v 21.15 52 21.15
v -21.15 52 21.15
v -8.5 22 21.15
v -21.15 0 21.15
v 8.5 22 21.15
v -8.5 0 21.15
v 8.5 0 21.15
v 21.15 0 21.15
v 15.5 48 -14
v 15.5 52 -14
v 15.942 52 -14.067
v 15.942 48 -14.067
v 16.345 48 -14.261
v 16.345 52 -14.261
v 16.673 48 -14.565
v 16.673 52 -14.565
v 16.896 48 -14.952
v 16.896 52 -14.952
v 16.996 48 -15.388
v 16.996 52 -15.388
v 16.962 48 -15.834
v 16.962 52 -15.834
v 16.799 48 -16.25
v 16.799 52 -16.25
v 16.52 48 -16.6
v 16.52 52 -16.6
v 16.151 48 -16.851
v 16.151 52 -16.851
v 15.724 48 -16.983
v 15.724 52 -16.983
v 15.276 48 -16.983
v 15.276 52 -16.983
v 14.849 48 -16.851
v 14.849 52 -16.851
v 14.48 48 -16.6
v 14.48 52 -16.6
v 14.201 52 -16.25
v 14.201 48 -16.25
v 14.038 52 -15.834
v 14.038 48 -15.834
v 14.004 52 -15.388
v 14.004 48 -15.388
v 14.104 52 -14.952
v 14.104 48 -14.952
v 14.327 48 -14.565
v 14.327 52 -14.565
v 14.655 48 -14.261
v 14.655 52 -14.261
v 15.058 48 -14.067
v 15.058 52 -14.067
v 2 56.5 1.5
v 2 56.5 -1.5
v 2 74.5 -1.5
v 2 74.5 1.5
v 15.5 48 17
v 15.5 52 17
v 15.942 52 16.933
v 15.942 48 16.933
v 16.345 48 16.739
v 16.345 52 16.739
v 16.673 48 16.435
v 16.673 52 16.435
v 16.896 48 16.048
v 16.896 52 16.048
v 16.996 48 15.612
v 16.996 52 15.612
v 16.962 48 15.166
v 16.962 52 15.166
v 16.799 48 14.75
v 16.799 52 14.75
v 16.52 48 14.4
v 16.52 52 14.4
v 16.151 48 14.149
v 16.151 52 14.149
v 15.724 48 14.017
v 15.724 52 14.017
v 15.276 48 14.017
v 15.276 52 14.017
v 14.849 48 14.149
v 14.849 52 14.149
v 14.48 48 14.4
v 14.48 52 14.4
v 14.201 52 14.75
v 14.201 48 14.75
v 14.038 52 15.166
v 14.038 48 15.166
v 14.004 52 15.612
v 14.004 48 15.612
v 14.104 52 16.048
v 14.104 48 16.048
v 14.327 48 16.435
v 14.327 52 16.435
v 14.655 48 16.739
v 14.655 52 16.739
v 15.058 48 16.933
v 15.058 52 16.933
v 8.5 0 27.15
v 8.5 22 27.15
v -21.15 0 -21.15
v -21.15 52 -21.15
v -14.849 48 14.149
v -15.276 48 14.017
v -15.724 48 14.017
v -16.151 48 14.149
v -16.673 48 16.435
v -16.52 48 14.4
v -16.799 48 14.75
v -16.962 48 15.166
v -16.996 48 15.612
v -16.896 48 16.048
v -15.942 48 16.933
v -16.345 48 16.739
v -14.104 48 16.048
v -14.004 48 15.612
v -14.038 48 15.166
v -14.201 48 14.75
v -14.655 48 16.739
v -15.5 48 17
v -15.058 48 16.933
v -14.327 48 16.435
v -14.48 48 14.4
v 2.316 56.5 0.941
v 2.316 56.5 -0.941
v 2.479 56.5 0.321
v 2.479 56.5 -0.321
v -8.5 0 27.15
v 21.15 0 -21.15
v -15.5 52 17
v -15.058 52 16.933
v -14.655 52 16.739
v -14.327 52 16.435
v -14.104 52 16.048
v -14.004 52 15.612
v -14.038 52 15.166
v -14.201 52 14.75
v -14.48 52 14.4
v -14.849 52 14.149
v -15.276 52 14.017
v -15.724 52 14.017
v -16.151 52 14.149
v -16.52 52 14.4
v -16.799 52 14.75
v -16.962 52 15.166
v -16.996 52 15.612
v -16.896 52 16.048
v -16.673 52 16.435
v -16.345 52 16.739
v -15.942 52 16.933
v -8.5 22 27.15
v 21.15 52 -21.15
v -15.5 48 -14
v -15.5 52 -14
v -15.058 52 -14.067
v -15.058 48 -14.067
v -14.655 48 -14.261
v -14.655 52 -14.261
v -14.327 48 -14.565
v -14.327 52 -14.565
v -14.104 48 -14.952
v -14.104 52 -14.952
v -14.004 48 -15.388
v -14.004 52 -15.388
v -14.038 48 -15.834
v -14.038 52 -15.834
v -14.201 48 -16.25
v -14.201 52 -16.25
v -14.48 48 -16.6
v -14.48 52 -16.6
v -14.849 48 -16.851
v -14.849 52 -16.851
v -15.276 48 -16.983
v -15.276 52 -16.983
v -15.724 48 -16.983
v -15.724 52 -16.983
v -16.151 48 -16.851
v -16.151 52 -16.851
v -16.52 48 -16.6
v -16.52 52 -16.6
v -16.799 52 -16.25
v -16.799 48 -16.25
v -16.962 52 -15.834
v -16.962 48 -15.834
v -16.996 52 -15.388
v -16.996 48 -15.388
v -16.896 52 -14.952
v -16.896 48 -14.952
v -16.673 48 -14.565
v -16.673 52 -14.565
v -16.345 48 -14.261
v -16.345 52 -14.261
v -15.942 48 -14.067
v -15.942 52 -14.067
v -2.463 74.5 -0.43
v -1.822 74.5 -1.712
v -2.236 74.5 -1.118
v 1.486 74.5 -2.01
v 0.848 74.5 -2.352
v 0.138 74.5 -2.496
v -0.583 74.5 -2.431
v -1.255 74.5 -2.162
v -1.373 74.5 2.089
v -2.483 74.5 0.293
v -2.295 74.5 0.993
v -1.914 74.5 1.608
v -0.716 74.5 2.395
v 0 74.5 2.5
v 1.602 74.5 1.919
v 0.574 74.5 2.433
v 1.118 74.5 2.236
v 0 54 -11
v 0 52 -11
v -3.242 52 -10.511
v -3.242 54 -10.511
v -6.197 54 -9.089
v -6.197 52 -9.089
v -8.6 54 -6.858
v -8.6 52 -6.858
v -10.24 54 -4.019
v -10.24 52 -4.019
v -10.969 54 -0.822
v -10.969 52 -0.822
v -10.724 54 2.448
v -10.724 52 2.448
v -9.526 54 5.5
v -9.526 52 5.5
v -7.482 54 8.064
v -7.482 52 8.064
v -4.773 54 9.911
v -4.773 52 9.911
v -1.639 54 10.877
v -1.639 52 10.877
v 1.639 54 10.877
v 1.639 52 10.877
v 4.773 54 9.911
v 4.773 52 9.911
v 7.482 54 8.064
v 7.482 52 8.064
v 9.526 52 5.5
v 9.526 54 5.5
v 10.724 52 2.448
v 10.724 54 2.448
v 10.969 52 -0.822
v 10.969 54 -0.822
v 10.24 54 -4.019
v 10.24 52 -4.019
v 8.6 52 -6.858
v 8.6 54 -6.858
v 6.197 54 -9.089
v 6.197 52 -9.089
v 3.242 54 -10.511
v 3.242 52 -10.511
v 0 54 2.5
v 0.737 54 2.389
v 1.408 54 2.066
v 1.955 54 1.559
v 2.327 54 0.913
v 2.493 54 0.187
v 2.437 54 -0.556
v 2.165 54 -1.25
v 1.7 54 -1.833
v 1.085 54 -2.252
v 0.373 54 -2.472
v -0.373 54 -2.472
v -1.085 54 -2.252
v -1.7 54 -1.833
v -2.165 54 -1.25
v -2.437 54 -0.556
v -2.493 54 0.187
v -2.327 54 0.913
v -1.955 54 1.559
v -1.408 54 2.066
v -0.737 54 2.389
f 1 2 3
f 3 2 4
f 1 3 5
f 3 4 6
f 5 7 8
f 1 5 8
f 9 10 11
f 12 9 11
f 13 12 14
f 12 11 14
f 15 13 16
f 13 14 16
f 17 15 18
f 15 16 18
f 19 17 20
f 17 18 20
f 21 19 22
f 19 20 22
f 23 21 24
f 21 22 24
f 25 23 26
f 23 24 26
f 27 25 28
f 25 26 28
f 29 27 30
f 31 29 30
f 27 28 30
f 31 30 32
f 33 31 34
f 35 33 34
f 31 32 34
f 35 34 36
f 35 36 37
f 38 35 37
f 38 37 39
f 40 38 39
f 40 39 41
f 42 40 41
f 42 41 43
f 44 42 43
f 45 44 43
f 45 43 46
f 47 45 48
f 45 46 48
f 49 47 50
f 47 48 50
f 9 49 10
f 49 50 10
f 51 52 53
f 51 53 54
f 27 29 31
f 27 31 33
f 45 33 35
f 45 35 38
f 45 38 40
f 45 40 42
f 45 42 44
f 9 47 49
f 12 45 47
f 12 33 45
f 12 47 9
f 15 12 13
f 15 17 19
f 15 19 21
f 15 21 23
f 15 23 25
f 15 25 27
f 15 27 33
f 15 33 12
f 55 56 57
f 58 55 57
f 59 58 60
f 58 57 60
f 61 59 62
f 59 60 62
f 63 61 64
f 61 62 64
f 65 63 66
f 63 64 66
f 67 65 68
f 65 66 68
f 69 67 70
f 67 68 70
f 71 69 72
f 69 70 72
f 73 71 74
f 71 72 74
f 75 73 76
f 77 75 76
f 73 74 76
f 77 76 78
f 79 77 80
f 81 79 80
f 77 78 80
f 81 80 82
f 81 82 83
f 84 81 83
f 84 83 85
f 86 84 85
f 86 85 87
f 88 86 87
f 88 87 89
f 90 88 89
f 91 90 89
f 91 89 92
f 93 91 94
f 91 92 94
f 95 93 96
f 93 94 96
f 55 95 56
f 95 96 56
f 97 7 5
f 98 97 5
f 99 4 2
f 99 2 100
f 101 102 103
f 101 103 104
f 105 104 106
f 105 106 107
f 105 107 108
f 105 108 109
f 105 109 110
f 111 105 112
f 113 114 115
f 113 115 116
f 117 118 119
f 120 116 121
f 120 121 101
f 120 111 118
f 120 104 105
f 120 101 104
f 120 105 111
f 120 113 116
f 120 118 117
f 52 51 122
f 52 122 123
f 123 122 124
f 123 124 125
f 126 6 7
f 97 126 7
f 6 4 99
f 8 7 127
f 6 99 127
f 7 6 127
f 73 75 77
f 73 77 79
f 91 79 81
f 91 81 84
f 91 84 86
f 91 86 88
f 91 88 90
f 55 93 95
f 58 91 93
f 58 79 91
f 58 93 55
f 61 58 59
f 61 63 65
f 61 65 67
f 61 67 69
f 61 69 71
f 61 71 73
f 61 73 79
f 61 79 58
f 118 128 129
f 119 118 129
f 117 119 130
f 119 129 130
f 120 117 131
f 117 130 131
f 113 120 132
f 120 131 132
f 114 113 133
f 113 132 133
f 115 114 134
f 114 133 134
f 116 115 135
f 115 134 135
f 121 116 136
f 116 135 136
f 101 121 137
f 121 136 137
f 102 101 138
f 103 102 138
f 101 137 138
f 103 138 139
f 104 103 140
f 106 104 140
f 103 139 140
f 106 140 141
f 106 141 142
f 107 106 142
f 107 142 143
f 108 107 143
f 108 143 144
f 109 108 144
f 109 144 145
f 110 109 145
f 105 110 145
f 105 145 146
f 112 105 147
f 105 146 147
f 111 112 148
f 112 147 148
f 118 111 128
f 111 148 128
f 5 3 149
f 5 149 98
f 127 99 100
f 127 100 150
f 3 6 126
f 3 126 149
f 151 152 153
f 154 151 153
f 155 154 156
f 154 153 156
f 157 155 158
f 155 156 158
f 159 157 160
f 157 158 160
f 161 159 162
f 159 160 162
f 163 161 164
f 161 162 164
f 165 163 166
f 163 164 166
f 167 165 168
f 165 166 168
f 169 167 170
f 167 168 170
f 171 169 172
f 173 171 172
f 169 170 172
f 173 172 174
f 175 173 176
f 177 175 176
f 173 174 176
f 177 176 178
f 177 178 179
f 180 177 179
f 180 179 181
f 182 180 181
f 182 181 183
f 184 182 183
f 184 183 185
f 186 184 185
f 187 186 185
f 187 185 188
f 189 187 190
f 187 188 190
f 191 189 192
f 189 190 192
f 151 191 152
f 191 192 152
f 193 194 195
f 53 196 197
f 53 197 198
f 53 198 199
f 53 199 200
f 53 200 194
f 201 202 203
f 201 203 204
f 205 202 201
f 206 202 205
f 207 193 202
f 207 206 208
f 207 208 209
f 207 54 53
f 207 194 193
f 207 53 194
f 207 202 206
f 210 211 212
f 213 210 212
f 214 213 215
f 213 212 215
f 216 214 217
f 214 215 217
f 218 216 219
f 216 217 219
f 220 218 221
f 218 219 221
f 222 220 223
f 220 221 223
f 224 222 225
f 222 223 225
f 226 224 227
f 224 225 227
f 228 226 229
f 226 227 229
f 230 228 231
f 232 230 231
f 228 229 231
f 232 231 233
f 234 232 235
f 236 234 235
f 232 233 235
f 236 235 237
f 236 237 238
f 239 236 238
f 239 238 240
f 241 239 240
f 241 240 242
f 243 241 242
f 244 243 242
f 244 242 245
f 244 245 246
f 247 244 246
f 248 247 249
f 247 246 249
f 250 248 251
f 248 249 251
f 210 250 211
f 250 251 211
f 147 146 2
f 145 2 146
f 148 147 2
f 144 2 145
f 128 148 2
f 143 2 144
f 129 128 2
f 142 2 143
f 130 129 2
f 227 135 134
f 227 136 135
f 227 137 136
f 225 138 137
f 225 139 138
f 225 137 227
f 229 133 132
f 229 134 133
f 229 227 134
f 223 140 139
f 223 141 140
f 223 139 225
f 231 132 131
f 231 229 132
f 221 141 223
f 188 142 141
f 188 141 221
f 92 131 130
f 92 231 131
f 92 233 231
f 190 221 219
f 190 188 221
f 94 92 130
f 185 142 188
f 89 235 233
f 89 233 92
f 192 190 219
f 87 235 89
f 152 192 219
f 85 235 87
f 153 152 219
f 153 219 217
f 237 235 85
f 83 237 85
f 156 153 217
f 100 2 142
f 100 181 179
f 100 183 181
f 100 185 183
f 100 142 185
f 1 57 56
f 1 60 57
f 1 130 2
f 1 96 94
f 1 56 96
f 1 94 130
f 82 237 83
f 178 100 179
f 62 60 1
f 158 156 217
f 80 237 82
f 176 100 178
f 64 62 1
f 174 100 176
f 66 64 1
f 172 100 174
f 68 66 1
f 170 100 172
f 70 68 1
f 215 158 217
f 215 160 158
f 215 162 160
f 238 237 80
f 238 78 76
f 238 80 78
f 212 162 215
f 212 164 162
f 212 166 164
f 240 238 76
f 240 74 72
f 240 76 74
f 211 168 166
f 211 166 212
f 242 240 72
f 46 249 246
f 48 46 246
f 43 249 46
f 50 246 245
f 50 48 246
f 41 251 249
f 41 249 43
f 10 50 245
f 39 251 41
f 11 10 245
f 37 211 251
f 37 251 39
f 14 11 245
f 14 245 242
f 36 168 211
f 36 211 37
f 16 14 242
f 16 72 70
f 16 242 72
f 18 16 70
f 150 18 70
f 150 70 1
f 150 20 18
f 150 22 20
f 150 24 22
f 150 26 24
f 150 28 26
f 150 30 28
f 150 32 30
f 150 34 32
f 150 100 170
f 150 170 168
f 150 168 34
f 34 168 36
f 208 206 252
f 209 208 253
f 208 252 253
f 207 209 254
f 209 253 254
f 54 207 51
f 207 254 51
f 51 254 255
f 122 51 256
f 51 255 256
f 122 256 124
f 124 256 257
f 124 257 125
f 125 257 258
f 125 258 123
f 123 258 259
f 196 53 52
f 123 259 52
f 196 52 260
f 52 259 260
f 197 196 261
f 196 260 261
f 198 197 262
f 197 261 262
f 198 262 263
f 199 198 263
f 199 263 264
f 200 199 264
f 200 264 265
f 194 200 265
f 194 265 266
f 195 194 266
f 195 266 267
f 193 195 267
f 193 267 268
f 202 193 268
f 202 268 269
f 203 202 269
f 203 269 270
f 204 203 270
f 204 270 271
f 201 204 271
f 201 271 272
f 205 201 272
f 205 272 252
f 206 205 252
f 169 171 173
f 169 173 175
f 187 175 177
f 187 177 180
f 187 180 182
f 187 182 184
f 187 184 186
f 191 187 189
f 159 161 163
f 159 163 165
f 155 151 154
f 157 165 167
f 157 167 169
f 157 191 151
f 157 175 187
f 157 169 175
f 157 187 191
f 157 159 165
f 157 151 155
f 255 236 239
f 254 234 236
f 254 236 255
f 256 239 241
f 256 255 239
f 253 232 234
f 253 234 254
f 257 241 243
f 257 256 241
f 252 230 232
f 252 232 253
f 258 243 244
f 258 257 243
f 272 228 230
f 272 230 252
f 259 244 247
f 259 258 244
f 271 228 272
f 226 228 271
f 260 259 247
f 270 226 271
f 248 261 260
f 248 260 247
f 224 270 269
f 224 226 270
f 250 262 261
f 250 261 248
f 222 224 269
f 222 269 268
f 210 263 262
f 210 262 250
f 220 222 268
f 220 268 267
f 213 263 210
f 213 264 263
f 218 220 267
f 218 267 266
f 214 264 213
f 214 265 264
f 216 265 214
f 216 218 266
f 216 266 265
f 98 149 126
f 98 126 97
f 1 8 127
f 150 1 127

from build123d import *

# Parameters (mm, degrees)
SKETCH_1_W          = 42.3
SKETCH_1_H          = 42.3
EXTRUDE_1_DEPTH     = 52
SKETCH_2_R          = 1.5
CUT_EXTRUDE_1_DEPTH = 4
SKETCH_3_R          = 11
EXTRUDE_2_DEPTH     = 2
SKETCH_4_R          = 2.5
EXTRUDE_3_DEPTH     = 20.5
CUT_EXTRUDE_START   = -18
CUT_EXTRUDE_4_DEPTH = 18
SKETCH_6_W          = 17
SKETCH_6_H          = 22
EXTRUDE_4_DEPTH     = 6


with BuildPart() as part:
    # 草图1 → 凸台-拉伸1 (new body)
    with BuildSketch(Plane(origin=(0, 0, 0), x_dir=(1, 0, 0), z_dir=(0, 1, 0))):
        Rectangle(SKETCH_1_W, SKETCH_1_H)
    extrude(amount=EXTRUDE_1_DEPTH)

    # 草图2 → 切除-拉伸1 (cut)
    with BuildSketch(Plane(origin=(0, 52, 0), x_dir=(1, 0, 0), z_dir=(0, 1, 0))):
        with Locations(Location((-15.5, 15.5, 0), (0, 0, 270))):
            Circle(SKETCH_2_R)
        with Locations(Location((15.5, 15.5, 0), (0, 0, 270))):
            Circle(SKETCH_2_R)
        with Locations(Location((15.5, -15.5, 0), (0, 0, 270))):
            Circle(SKETCH_2_R)
        with Locations(Location((-15.5, -15.5, 0), (0, 0, 270))):
            Circle(SKETCH_2_R)
    extrude(amount=-CUT_EXTRUDE_1_DEPTH, mode=Mode.SUBTRACT)

    # 草图3 → 凸台-拉伸2 (add)
    with BuildSketch(Plane(origin=(0, 52, 0), x_dir=(1, 0, 0), z_dir=(0, 1, 0))):
        with Locations(Location((0, 0, 0), (0, 0, 90))):
            Circle(SKETCH_3_R)
    extrude(amount=EXTRUDE_2_DEPTH)

    # 草图4 → 凸台-拉伸3 (add)
    with BuildSketch(Plane(origin=(0, 54, 0), x_dir=(1, 0, 0), z_dir=(0, 1, 0))):
        with Locations(Location((0, 0, 0), (0, 0, 270))):
            Circle(SKETCH_4_R)
    extrude(amount=EXTRUDE_3_DEPTH)

    # 草图5 → 切除-拉伸4 (cut)
    with BuildSketch(Plane(origin=(0, 74.5, 0), x_dir=(1, 0, 0), z_dir=(0, 1, 0)).offset(CUT_EXTRUDE_START)):
        with BuildLine():
            Line((2, 1.5), (2, -1.5))
            ThreePointArc((2, -1.5), (2.5, 0), (2, 1.5))
        make_face()
    extrude(amount=CUT_EXTRUDE_4_DEPTH, mode=Mode.SUBTRACT)

    # 草图6 → 凸台-拉伸4 (add)
    with BuildSketch(Plane.XY.offset(21.15)):
        with Locations((0, 11)):
            Rectangle(SKETCH_6_W, SKETCH_6_H)
    extrude(amount=EXTRUDE_4_DEPTH)


solid = part.part
